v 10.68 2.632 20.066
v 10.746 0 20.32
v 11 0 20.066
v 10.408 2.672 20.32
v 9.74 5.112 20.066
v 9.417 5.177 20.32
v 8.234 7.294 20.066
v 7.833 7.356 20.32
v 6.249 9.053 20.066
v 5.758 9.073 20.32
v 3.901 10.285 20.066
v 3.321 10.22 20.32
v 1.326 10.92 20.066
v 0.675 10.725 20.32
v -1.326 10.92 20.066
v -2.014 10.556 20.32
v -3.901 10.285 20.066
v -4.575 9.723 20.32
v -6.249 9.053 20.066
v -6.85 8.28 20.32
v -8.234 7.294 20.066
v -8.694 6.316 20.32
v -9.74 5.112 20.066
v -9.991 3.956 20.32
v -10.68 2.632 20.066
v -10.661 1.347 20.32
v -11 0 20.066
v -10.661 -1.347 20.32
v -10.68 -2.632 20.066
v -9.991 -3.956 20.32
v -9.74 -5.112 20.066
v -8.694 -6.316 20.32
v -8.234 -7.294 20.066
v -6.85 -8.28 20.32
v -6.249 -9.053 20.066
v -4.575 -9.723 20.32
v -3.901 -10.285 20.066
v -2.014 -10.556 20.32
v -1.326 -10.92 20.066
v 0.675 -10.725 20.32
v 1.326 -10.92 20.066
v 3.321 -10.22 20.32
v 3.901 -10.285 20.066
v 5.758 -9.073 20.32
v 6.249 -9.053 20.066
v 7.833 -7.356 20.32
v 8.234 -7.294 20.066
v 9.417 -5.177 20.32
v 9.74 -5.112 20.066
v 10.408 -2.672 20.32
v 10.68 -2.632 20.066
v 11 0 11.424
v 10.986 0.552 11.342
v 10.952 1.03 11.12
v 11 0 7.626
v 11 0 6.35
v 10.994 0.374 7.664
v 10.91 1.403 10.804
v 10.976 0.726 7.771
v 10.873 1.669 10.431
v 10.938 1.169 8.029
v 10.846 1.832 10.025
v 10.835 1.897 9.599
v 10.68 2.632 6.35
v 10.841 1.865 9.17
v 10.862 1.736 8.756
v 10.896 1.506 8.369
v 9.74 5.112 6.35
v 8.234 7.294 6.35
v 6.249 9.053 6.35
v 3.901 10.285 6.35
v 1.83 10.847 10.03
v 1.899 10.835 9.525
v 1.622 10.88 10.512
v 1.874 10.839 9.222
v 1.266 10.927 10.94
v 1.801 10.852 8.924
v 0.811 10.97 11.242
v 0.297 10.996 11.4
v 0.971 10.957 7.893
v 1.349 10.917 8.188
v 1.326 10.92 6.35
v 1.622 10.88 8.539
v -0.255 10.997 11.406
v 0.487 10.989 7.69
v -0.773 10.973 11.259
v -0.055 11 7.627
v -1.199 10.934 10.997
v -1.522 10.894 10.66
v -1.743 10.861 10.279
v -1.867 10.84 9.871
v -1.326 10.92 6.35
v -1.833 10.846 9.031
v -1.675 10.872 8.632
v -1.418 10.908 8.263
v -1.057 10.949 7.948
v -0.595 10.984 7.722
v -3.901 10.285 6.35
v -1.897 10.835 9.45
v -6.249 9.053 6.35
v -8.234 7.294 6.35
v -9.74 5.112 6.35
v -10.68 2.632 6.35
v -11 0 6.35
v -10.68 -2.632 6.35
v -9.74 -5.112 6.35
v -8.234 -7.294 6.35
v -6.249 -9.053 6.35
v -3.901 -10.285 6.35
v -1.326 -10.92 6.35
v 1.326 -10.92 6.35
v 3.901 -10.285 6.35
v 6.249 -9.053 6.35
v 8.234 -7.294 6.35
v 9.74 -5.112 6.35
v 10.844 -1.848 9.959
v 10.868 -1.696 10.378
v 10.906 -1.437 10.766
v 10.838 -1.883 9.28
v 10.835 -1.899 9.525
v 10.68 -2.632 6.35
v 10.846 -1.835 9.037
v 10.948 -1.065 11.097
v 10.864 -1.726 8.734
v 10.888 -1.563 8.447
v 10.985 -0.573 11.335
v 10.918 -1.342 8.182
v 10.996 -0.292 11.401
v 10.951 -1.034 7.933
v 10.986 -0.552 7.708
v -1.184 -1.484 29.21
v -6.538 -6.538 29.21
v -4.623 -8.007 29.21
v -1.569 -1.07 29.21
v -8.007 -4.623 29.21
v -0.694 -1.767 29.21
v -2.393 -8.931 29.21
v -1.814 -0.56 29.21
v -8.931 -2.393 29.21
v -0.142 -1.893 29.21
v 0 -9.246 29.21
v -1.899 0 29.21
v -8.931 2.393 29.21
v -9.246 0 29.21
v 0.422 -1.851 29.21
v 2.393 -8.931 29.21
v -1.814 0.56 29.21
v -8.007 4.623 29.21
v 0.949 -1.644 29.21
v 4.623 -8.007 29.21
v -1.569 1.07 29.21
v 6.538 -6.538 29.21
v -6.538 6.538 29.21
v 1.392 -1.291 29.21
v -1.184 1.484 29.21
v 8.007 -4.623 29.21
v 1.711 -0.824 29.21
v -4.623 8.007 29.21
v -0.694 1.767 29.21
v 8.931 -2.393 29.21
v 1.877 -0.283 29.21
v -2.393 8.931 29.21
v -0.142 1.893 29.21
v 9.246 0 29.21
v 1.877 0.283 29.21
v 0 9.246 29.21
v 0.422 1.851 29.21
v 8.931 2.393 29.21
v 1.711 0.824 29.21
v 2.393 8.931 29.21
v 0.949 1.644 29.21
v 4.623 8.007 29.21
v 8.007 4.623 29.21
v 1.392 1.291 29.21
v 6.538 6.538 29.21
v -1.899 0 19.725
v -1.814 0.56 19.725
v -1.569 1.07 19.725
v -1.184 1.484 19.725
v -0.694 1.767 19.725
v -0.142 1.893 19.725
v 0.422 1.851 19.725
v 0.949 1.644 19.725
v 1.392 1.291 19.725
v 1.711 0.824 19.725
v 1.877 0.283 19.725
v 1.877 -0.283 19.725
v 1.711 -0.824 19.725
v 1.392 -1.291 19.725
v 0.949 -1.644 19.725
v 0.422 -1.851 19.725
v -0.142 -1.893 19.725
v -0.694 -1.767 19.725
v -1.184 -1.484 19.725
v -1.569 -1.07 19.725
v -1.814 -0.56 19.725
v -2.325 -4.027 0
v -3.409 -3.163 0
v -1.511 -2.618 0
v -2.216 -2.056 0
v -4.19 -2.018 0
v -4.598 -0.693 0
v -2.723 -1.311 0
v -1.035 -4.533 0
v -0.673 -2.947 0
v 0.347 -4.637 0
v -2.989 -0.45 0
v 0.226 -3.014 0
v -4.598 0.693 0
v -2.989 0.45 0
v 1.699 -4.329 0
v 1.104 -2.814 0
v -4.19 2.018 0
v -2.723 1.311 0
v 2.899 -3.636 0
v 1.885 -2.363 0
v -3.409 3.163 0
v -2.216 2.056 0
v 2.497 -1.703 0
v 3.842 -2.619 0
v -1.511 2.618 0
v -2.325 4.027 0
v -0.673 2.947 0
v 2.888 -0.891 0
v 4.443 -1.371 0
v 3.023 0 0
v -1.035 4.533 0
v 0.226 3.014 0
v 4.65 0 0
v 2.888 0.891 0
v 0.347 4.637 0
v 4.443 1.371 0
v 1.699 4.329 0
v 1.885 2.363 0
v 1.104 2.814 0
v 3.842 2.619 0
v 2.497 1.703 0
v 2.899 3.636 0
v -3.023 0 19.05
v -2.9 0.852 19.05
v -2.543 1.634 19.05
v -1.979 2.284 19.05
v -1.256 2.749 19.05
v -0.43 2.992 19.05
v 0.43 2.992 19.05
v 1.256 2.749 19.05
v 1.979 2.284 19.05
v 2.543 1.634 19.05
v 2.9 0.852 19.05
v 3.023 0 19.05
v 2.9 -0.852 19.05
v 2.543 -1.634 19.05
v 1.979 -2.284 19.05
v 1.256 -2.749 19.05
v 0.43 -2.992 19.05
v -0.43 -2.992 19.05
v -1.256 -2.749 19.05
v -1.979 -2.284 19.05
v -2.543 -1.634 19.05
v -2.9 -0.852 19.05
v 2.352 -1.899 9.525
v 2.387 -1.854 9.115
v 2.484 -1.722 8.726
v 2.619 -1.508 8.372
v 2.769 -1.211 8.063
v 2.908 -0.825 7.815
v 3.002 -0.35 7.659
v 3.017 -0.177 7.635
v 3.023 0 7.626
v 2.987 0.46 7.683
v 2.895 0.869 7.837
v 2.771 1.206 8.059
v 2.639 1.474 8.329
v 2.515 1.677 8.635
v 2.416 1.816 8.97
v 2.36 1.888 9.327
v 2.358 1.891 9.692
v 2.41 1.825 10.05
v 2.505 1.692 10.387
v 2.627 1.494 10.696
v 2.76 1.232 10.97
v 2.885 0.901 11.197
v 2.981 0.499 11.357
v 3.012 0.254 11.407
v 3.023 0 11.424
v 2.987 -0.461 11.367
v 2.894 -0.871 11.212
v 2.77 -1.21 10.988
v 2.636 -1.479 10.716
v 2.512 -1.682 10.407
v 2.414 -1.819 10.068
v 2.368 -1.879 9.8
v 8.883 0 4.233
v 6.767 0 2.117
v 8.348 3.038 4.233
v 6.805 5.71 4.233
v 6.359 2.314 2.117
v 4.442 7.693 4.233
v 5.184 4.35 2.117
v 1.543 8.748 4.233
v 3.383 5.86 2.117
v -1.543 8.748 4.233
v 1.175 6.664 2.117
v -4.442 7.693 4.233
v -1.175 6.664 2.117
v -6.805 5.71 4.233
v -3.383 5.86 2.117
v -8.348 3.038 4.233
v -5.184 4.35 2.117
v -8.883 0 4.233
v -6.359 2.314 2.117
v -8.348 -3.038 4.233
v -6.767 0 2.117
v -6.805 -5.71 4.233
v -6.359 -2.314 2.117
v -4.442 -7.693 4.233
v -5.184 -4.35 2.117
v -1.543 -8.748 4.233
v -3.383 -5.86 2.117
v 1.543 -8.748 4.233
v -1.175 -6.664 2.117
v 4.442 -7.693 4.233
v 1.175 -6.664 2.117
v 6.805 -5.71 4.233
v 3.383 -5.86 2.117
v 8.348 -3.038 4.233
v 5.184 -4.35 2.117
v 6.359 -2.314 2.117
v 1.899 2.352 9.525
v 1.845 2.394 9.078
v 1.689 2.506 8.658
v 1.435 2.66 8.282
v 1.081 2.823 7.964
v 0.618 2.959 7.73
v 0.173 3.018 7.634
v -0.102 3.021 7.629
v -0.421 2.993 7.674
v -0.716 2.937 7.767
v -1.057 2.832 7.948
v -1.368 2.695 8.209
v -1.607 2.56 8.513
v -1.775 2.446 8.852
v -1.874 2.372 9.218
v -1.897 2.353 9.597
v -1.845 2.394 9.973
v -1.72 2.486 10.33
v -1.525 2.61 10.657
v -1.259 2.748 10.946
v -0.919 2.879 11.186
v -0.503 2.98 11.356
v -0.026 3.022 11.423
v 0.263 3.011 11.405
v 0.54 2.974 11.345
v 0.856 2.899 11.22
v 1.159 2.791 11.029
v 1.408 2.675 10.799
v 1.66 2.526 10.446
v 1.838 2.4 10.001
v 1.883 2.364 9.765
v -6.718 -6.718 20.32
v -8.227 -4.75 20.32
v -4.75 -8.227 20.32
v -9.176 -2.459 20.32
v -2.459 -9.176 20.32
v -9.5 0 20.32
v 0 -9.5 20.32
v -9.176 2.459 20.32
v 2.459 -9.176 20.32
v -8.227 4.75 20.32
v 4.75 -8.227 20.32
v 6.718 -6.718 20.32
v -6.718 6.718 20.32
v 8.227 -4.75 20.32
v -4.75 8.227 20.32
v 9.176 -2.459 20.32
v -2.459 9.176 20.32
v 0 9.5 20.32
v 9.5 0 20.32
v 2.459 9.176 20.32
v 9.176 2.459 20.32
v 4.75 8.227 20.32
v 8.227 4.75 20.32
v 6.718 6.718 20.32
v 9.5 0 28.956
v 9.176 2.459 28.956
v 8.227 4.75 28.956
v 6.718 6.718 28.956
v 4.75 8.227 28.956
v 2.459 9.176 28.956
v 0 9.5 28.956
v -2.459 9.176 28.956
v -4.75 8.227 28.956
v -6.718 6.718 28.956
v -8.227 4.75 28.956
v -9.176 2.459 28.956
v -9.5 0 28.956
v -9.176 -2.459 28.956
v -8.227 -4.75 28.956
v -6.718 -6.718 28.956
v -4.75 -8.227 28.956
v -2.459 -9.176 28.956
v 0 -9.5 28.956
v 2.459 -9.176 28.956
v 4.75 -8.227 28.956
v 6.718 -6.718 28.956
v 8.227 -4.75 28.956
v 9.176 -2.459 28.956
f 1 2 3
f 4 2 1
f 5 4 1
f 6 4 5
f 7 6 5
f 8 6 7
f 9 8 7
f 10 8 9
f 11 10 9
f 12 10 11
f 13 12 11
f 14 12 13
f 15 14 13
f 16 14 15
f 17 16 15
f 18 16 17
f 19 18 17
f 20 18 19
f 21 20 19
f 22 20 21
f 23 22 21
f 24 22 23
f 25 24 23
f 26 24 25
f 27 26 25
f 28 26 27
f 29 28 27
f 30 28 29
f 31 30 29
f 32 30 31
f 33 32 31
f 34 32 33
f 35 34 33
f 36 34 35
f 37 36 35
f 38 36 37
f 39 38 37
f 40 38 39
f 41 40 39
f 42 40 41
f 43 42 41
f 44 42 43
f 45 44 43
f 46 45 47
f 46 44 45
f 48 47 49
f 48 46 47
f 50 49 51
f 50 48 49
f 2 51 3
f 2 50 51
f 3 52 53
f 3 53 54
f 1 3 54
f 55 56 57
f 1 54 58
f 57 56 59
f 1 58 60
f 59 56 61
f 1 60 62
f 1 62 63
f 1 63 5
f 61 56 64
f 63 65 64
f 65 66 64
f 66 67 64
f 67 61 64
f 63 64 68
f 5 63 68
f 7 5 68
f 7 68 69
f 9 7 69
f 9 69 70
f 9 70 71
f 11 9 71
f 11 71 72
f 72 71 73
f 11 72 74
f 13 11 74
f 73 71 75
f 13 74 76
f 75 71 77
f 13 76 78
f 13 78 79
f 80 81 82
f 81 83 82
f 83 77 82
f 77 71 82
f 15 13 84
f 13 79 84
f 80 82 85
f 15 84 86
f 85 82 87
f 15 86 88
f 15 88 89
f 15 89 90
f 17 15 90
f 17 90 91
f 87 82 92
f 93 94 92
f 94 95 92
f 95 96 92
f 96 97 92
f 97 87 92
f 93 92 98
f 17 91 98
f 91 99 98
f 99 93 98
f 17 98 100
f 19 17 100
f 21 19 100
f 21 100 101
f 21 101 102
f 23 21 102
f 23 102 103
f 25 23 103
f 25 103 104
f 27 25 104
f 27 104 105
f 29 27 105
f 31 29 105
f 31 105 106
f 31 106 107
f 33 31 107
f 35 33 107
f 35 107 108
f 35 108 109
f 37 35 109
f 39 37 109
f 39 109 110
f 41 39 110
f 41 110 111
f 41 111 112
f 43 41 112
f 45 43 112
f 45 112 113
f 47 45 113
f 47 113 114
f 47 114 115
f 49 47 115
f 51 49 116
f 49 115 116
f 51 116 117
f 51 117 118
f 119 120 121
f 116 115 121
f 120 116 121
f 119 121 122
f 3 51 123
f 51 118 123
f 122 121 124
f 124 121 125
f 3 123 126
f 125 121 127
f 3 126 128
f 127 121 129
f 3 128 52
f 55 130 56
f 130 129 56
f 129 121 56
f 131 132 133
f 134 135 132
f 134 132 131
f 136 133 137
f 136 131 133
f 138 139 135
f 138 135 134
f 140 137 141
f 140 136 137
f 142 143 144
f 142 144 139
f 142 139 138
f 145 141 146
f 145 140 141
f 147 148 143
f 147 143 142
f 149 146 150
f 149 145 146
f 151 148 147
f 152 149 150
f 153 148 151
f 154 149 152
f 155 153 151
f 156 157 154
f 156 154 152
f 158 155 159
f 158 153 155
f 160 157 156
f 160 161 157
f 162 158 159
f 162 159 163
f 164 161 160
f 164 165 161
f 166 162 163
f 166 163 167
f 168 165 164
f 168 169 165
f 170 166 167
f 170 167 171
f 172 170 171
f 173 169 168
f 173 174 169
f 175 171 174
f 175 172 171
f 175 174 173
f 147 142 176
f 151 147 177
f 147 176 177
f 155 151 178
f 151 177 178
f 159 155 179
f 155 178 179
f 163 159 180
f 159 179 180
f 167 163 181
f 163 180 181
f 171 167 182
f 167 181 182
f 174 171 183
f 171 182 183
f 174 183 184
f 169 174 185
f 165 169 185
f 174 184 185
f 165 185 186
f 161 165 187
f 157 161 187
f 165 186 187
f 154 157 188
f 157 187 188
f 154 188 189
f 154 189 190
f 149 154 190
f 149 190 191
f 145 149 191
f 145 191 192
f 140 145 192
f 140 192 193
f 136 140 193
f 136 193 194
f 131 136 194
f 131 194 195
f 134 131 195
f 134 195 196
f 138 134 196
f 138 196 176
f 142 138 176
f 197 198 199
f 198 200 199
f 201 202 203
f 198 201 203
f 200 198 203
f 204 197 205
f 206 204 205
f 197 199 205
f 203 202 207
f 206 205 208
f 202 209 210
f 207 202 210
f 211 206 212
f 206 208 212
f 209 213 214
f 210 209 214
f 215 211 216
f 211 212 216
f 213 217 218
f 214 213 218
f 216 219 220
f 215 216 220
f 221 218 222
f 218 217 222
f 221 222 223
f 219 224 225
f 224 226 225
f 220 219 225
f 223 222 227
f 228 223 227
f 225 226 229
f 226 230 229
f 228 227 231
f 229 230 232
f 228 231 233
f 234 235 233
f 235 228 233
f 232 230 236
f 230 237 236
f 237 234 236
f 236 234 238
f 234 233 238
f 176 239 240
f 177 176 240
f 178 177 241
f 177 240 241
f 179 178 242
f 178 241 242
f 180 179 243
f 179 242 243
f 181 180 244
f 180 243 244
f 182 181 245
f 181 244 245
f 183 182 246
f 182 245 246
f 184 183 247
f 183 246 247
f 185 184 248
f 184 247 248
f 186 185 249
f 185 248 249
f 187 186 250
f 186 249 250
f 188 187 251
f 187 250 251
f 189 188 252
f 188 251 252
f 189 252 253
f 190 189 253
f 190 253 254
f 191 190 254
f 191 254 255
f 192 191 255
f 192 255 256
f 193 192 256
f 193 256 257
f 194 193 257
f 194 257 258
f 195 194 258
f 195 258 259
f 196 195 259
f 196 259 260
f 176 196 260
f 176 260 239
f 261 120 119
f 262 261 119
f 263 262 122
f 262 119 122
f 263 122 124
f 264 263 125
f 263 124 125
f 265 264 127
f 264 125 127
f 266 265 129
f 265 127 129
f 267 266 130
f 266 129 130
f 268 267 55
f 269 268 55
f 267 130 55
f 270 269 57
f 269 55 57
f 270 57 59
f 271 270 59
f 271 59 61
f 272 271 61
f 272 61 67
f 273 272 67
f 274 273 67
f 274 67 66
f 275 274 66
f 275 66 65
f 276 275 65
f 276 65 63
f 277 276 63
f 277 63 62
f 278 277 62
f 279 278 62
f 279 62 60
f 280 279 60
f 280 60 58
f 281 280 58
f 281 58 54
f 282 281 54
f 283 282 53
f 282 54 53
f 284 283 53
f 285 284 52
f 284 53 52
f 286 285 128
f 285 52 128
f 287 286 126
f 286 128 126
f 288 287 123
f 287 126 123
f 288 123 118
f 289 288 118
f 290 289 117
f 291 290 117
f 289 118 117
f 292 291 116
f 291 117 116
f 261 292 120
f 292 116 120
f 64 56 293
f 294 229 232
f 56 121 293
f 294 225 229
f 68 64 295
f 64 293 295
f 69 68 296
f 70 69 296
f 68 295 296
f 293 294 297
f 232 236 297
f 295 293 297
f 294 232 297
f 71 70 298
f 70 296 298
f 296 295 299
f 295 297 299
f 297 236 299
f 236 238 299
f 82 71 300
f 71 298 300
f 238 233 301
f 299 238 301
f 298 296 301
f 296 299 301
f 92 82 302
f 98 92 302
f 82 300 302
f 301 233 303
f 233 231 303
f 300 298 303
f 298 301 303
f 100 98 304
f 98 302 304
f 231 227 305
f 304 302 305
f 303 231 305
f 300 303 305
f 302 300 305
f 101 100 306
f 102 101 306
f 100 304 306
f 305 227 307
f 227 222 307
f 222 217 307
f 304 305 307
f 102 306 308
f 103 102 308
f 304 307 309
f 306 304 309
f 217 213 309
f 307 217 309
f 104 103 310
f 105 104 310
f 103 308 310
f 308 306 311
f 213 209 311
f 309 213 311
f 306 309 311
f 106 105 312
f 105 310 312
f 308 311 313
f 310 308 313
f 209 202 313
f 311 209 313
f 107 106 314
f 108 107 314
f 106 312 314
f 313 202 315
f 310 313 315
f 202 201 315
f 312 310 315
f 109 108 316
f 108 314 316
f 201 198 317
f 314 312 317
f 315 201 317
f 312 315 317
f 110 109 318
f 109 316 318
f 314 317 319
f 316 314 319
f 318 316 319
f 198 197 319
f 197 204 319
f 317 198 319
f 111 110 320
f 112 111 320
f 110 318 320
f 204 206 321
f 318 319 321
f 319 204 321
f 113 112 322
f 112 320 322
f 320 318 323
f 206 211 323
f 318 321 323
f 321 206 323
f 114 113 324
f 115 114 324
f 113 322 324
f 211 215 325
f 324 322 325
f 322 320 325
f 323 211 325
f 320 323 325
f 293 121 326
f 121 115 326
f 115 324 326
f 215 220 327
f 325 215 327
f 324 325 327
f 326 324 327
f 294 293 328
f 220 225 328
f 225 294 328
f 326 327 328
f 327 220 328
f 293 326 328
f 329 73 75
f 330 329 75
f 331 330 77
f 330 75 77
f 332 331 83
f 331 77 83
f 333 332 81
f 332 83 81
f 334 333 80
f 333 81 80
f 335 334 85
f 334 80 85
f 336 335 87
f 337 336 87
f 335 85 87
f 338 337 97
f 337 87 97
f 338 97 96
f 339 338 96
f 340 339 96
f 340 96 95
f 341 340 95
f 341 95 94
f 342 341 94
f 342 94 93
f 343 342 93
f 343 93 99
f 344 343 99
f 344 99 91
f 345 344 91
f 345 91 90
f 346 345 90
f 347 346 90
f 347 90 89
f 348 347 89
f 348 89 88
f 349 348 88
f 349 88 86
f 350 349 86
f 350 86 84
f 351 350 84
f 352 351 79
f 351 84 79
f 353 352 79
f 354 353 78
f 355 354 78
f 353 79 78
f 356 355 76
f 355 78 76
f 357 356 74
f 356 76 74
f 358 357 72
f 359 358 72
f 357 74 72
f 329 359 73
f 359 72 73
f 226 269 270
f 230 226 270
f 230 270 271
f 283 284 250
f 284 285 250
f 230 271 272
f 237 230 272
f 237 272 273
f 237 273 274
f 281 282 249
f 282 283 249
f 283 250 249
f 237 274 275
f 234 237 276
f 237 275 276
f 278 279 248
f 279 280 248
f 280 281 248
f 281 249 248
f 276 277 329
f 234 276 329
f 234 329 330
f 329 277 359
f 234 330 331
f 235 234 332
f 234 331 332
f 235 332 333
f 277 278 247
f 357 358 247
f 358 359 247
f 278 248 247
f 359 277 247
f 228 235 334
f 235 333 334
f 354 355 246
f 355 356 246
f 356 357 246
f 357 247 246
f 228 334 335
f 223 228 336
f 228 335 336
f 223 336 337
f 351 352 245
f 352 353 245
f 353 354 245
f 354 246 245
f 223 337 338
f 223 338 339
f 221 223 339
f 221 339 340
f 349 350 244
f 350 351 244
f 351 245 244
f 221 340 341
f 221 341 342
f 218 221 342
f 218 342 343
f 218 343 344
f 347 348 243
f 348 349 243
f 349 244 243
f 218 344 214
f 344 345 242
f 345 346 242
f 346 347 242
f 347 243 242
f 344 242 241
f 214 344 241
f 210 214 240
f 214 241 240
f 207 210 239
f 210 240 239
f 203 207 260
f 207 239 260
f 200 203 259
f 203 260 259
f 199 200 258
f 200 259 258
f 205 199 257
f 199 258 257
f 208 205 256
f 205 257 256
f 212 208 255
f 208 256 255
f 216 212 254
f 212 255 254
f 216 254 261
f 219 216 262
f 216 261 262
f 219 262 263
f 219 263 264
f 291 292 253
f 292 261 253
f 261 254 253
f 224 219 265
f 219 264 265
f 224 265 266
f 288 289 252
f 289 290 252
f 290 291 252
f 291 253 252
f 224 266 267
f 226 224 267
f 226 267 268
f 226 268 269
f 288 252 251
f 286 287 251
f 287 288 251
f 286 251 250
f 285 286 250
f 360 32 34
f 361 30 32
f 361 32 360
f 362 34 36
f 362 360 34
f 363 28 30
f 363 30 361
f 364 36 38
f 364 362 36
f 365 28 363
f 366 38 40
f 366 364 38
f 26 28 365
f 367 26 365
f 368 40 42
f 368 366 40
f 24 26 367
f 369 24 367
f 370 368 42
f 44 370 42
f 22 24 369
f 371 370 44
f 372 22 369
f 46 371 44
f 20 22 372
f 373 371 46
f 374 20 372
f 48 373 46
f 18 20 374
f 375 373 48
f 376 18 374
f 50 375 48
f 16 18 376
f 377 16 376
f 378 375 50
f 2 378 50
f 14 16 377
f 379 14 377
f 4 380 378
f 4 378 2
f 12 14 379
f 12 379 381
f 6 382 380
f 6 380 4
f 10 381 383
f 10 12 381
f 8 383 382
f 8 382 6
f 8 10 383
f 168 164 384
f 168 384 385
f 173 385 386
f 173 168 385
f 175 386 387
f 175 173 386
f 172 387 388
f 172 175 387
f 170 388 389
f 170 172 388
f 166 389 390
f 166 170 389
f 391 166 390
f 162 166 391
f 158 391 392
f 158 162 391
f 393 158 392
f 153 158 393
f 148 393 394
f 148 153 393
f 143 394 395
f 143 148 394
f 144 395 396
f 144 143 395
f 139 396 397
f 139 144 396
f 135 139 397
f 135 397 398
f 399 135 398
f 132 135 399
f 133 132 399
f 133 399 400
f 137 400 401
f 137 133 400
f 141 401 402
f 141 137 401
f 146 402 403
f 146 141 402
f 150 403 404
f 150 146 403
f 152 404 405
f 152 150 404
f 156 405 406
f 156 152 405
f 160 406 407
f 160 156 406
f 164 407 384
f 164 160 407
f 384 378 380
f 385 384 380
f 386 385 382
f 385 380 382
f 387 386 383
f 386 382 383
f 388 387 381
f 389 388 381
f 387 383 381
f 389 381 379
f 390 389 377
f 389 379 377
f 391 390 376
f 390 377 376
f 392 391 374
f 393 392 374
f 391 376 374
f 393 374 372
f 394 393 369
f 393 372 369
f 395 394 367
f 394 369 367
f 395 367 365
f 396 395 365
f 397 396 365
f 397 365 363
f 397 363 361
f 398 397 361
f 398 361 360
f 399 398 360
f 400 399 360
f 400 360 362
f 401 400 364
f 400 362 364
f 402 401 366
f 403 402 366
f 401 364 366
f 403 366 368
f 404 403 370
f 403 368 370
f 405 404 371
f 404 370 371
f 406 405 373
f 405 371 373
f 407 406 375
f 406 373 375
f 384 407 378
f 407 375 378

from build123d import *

# Parameters (mm, degrees)
SKETCH1_R                    = 11
BOSS_EXTRUDE1_DEPTH          = 20.32
SKETCH5_R                    = 9.5
BOSS_EXTRUDE6_DEPTH          = 8.89
B_0_238_DIAMETER_HOLE1_D     = 6.0452
B_0_238_DIAMETER_HOLE1_DEPTH = 19.05
B_0_238_DIAMETER_HOLE1_TIP   = 1.816161307
F_10_24_TAPPED_HOLE1_REACH   = 33.504
F_10_24_TAPPED_HOLE1_BORE_R  = 1.89865
F_10_24_TAPPED_HOLE2_D       = 3.7973
CHAMFER1_SIZE                = 6.35
CHAMFER2_SIZE                = 0.254
CIRPATTERN1_COUNT            = 2
CIRPATTERN1_ANGLE            = 90


with BuildPart() as part:
    # Sketch1 → Boss-Extrude1 (new body)
    with BuildSketch(Plane.XY):
        Circle(SKETCH1_R)
    extrude(amount=BOSS_EXTRUDE1_DEPTH)

    # Sketch5 → Boss-Extrude6 (add)
    with BuildSketch(Plane.XY.offset(20.32)):
        Circle(SKETCH5_R)
    extrude(amount=BOSS_EXTRUDE6_DEPTH)

    # B (0.238) Diameter Hole1
    with Locations(Plane(origin=(0, 0, 0), x_dir=(-1, 0, 0), z_dir=(0, 0, -1))):
        with Locations((0, 0)):
            Hole(B_0_238_DIAMETER_HOLE1_D / 2, depth=B_0_238_DIAMETER_HOLE1_DEPTH)
            with Locations((0, 0, -(B_0_238_DIAMETER_HOLE1_DEPTH + B_0_238_DIAMETER_HOLE1_TIP / 2))):  # 118° drill point
                Cone(0, B_0_238_DIAMETER_HOLE1_D / 2, B_0_238_DIAMETER_HOLE1_TIP, mode=Mode.SUBTRACT)

    # #10-24 Tapped Hole1 bore (on position points) → #10-24 Tapped Hole1 (cut, up to next)
    with BuildSketch(Plane(origin=(0, 11, 9.525), x_dir=(1, 0, 0), z_dir=(0, 1, 0)), mode=Mode.PRIVATE) as f_10_24_tapped_hole1_sk1:
        Circle(F_10_24_TAPPED_HOLE1_BORE_R)
    f_10_24_tapped_hole1_tool1 = extrude(f_10_24_tapped_hole1_sk1.sketch, amount=-F_10_24_TAPPED_HOLE1_REACH, mode=Mode.PRIVATE) & part.part
    f_10_24_tapped_hole1 = f_10_24_tapped_hole1_tool1.solids().sort_by_distance((0, 11, 9.525))[0]
    add(f_10_24_tapped_hole1, mode=Mode.SUBTRACT)

    # #10-24 Tapped Hole2 (through all)
    with Locations(Plane.XY.offset(29.21)):
        with Locations((0, 0)):
            Hole(F_10_24_TAPPED_HOLE2_D / 2)

    # Chamfer1
    chamfer1_edges = [part.edges().sort_by_distance(p)[0] for p in [
        (-11, 0, 0),
    ]]
    chamfer(chamfer1_edges, length=CHAMFER1_SIZE)

    # Chamfer2
    chamfer2_edges = [part.edges().sort_by_distance(p)[0] for p in [
        (-11, 0, 20.32),
        (-9.5, 0, 29.21),
    ]]
    chamfer(chamfer2_edges, length=CHAMFER2_SIZE)

    # CirPattern1: #10-24 Tapped Hole1 ×2 about axis
    cirpattern1_axis = Axis((0, 0, 20.32), (0, 0, -1))
    for i in range(1, CIRPATTERN1_COUNT):
        add(f_10_24_tapped_hole1.rotate(cirpattern1_axis, i * CIRPATTERN1_ANGLE / (CIRPATTERN1_COUNT - 1)), mode=Mode.SUBTRACT)


solid = part.part
